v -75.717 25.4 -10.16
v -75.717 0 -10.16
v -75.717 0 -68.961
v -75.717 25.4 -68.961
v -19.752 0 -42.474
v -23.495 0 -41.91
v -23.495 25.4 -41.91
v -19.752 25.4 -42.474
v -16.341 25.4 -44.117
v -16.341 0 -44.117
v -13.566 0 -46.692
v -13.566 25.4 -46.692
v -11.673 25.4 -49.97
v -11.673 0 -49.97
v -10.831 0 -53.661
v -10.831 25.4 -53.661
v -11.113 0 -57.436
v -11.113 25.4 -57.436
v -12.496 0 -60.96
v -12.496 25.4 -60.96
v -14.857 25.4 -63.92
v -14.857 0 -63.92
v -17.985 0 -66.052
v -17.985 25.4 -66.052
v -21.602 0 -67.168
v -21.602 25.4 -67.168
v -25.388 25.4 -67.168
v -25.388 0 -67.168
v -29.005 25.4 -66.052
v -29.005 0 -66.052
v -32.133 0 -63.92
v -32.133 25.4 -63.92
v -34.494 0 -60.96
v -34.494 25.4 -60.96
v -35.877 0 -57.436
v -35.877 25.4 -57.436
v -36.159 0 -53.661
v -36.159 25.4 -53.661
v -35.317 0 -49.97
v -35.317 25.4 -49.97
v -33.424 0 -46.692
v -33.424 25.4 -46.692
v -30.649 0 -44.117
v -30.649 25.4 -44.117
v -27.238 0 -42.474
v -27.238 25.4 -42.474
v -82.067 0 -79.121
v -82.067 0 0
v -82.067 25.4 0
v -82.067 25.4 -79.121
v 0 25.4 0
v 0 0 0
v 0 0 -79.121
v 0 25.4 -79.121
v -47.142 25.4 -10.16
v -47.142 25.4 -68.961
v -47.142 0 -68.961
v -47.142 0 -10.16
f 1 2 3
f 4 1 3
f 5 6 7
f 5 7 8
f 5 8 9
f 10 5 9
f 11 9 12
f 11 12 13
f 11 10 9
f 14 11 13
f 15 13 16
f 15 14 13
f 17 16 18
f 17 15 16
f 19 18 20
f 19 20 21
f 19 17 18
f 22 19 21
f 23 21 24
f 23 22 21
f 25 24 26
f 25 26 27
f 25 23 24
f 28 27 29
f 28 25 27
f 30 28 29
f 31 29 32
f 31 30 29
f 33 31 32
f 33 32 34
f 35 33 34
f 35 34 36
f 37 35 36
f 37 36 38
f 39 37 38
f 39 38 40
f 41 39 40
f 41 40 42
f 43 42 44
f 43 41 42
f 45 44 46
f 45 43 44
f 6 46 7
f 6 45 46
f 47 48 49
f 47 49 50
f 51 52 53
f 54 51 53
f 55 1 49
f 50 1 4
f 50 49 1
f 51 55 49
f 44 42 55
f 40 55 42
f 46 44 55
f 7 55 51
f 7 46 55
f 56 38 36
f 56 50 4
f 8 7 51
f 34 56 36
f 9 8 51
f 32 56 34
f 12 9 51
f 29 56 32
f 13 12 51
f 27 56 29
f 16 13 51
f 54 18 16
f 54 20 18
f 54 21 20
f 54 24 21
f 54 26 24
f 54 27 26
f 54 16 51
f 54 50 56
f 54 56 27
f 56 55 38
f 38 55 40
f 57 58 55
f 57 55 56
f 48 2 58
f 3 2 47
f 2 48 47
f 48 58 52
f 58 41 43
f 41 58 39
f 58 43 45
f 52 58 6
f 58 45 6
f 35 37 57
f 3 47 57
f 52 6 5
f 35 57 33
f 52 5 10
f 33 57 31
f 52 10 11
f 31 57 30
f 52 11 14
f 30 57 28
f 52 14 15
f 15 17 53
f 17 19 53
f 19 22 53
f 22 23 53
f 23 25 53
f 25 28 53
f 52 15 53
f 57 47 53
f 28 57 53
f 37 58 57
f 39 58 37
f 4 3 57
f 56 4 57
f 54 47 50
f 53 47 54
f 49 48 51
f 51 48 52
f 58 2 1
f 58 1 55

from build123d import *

# Parameters (mm, degrees)
SKETCH1_W           = 82.0674
SKETCH1_H           = 79.121
SKETCH1_R           = 12.7
SKETCH1_W_2         = 28.575
SKETCH1_H_2         = 58.801
BOSS_EXTRUDE1_DEPTH = 25.4


with BuildPart() as part:
    # Sketch1 → Boss-Extrude1 (new body)
    with BuildSketch(Plane(origin=(0, 0, 0), x_dir=(1, 0, 0), z_dir=(0, 1, 0))):
        with Locations((-41.0337, 39.5605)):
            Rectangle(SKETCH1_W, SKETCH1_H)
        with Locations(Location((-23.495, 54.61, 0), (0, 0, 270))):
            Circle(SKETCH1_R, mode=Mode.SUBTRACT)
        with Locations((-61.4299, 39.5605)):
            Rectangle(SKETCH1_W_2, SKETCH1_H_2, mode=Mode.SUBTRACT)
    extrude(amount=BOSS_EXTRUDE1_DEPTH)


solid = part.part
